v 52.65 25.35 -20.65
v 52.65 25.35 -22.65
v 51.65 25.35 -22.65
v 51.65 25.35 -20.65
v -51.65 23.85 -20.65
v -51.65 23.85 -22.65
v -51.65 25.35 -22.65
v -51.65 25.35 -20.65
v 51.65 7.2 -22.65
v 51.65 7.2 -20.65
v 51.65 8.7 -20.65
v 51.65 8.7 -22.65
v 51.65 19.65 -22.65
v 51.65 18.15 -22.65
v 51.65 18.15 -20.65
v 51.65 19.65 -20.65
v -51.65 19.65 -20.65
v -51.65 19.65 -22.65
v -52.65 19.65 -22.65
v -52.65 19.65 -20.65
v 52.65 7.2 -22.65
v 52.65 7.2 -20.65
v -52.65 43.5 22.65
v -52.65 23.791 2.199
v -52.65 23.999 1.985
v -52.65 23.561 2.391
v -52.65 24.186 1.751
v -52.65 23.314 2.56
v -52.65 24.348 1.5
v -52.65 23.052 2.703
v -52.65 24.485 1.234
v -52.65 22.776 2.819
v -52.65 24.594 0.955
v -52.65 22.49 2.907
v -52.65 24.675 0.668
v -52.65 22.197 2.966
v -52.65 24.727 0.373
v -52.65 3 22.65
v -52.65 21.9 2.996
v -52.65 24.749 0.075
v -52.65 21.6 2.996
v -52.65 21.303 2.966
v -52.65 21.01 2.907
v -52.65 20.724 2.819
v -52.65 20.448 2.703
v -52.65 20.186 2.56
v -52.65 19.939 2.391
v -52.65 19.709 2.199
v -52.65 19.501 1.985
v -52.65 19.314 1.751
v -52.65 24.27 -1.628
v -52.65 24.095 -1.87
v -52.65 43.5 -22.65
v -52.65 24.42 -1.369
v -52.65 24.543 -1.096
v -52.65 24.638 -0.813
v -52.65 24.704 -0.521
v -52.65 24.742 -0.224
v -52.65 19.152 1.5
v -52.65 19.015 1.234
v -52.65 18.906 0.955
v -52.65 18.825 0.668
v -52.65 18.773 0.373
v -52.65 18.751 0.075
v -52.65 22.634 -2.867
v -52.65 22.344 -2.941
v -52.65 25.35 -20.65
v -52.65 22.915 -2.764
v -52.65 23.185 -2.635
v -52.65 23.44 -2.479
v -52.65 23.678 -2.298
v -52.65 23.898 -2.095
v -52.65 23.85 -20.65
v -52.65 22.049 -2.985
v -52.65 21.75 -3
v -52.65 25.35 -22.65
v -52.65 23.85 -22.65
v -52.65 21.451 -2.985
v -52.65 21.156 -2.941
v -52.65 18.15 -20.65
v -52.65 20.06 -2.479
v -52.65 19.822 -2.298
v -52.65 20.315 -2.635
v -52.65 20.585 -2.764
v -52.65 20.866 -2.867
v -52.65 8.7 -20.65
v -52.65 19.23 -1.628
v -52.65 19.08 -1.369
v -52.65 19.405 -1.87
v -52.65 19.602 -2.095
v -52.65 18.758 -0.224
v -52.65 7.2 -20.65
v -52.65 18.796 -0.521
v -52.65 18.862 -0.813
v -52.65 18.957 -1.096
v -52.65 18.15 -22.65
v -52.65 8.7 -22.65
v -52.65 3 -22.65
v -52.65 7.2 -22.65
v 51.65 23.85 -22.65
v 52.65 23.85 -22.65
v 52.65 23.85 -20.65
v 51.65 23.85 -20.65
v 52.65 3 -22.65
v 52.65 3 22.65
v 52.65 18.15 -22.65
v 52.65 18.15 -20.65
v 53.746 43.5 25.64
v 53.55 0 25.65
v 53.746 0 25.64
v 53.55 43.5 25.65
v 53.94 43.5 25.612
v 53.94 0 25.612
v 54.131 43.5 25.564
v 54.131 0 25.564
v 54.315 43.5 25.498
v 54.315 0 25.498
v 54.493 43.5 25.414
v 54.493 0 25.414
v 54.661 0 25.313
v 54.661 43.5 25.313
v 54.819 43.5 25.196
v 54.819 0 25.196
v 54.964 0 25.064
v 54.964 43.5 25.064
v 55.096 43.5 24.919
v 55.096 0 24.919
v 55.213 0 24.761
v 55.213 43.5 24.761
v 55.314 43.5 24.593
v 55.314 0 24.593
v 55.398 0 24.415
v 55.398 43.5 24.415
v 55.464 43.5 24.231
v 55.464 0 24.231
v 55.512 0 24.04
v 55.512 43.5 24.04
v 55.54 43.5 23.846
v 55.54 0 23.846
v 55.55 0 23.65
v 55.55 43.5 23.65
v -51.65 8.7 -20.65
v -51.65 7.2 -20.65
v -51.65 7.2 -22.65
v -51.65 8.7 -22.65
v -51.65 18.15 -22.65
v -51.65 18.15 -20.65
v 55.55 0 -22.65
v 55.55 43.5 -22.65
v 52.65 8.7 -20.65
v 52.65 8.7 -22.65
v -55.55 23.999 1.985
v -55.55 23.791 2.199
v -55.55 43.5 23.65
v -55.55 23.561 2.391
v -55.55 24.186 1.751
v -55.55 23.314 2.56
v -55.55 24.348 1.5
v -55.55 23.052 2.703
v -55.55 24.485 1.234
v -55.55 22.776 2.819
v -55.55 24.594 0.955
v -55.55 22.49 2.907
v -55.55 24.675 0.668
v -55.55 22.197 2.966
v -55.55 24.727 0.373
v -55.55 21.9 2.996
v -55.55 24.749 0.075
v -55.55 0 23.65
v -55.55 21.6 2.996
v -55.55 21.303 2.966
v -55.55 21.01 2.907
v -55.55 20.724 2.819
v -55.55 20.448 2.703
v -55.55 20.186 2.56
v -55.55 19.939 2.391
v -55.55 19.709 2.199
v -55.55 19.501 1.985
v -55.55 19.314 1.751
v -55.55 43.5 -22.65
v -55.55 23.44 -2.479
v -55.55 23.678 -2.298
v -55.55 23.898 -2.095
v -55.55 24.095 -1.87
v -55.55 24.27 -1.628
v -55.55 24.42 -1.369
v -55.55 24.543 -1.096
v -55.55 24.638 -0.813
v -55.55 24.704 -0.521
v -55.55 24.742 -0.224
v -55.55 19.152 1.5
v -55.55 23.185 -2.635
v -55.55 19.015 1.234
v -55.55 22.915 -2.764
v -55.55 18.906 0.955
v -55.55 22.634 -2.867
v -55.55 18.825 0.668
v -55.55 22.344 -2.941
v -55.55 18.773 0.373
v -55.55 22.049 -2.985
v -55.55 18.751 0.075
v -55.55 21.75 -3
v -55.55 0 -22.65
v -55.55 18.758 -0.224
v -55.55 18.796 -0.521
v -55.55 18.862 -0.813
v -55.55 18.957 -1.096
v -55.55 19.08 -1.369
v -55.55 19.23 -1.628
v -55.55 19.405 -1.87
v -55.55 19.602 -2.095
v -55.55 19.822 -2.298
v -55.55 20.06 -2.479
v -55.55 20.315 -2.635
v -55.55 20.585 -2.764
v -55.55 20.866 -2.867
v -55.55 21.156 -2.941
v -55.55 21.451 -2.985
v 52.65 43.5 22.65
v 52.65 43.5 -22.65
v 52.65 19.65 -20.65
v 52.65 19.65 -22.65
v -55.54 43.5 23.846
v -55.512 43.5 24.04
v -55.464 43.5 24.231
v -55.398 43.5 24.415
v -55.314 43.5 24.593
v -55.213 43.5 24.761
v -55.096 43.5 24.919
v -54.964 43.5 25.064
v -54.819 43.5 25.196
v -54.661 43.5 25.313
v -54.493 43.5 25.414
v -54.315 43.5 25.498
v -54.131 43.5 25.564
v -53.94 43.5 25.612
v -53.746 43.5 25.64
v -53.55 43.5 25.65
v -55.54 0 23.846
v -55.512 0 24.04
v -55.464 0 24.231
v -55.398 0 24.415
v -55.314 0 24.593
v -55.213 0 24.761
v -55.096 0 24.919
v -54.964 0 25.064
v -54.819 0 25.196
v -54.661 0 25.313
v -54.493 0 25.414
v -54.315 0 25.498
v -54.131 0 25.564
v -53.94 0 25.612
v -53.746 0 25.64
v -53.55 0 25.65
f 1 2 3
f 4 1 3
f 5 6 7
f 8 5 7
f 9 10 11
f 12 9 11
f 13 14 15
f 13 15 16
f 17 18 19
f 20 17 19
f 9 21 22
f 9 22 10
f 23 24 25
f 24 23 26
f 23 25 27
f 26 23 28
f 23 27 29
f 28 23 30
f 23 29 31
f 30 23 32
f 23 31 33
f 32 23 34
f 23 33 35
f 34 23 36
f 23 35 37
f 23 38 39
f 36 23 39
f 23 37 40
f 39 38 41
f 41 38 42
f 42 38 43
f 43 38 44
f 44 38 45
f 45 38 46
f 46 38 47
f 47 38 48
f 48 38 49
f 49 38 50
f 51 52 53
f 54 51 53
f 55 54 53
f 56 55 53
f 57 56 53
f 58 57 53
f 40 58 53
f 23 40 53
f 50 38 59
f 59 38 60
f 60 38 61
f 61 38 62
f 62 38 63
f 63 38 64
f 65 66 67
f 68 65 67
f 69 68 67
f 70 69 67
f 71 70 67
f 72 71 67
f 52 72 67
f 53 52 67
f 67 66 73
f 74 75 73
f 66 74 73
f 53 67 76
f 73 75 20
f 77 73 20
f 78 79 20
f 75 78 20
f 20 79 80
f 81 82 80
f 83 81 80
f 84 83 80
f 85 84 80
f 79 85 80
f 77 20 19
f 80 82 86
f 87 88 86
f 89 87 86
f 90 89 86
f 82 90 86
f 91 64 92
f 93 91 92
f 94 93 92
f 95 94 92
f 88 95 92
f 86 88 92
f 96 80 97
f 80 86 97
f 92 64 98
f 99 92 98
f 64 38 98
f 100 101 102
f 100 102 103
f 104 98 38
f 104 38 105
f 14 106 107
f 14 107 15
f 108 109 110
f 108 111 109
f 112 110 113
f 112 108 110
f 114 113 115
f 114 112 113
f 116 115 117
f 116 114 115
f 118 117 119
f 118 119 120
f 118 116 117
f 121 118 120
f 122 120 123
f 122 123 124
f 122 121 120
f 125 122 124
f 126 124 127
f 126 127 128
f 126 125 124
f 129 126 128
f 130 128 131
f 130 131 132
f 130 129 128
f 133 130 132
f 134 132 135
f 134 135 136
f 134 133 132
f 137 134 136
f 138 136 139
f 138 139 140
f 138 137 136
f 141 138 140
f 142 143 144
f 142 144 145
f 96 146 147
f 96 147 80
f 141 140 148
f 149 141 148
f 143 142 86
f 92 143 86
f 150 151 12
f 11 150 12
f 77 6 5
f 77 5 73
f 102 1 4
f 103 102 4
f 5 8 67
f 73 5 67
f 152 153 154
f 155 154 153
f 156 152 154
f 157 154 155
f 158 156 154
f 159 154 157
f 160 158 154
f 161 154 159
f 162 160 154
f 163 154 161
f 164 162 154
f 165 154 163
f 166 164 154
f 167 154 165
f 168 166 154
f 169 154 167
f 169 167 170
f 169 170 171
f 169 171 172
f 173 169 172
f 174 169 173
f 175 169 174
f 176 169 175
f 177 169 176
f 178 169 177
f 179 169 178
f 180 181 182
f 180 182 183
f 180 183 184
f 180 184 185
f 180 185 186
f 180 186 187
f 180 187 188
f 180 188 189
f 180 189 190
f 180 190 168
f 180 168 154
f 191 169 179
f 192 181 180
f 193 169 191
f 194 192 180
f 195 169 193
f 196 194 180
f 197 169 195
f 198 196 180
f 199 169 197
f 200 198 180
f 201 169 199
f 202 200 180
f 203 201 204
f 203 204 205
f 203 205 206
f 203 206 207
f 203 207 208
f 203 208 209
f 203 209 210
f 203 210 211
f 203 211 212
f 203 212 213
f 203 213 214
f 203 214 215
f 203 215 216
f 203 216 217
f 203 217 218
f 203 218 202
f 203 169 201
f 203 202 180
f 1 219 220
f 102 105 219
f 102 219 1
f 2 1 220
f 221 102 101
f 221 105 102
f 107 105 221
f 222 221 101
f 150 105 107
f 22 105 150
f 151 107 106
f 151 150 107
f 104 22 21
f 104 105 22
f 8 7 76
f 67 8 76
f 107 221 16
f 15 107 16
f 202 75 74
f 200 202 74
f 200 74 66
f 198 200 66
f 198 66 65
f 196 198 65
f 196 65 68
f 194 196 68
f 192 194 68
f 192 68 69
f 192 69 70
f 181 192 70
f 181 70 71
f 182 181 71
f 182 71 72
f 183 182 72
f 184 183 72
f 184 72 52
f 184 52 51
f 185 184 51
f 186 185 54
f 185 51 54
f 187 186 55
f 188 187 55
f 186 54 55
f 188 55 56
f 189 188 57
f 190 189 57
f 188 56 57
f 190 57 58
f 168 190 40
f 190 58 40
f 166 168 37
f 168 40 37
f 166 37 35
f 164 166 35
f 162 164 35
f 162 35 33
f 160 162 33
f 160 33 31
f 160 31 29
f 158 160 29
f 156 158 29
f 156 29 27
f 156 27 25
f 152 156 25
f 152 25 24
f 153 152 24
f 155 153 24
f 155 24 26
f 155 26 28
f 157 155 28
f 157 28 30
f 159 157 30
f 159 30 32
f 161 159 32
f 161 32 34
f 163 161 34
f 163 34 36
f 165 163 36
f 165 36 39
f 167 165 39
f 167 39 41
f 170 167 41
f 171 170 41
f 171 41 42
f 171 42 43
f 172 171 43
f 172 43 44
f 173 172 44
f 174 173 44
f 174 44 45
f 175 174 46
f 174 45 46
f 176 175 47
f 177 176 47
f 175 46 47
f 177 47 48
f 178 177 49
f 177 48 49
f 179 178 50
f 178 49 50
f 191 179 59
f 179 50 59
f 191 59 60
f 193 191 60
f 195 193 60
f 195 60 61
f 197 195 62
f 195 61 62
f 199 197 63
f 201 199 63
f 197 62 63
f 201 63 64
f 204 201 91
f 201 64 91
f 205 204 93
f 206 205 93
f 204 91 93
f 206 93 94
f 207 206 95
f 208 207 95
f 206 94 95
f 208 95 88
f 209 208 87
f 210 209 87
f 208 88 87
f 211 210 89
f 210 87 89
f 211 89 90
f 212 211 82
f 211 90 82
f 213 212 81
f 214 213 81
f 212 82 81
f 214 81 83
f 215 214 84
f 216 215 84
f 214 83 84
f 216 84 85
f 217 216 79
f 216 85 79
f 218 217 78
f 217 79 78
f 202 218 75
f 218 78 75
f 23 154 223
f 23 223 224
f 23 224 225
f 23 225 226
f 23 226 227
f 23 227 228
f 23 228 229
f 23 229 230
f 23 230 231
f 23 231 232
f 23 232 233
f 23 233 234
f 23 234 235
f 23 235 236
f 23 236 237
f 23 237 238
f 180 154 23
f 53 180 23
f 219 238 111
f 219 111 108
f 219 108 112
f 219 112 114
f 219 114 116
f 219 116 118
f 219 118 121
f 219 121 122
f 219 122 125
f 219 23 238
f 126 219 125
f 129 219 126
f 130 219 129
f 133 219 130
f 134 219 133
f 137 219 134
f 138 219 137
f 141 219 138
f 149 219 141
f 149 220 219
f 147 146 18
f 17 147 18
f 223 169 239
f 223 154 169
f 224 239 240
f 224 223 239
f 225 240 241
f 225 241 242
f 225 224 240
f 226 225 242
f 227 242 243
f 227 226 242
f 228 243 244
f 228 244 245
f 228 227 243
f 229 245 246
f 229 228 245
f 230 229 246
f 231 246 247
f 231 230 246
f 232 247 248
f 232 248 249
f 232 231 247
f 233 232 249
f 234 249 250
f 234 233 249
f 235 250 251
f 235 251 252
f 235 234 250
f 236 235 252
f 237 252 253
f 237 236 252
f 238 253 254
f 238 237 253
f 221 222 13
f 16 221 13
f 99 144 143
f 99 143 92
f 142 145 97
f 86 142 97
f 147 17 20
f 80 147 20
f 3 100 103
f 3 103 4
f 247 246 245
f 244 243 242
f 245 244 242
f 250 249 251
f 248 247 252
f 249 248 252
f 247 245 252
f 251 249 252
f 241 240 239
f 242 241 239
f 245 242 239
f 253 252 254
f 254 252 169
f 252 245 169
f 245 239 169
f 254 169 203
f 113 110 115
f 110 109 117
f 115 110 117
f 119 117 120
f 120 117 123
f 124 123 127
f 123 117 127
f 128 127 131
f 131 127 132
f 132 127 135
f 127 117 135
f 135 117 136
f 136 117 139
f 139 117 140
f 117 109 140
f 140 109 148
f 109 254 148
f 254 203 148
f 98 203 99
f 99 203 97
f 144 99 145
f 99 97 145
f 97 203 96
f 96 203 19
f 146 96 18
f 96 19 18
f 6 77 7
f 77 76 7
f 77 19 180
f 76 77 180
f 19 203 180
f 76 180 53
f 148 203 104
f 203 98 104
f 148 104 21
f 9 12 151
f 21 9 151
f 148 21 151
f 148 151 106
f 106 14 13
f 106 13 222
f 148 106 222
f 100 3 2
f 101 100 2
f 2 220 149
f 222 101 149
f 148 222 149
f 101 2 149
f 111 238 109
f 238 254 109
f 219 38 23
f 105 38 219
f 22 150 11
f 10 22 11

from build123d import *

# Parameters (mm, degrees)
SKETCH1_W           = 111.1
SKETCH1_H           = 51.3
BOSS_EXTRUDE1_DEPTH = 3
SKETCH2_W           = 111.1
SKETCH2_H           = 51.3
SKETCH2_W_2         = 105.3
SKETCH2_H_2         = 45.3
BOSS_EXTRUDE2_DEPTH = 40.5
SKETCH5_R           = 21
BOSS_EXTRUDE4_DEPTH = 15
SKETCH6_W           = 15.5
SKETCH6_H           = 37
CUT_EXTRUDE1_DEPTH  = 21
BOSS_EXTRUDE5_START = -1
SKETCH8_R           = 21
SKETCH8_W           = 12.3
SKETCH8_H           = 34.3
BOSS_EXTRUDE5_DEPTH = 1
BOSS_EXTRUDE6_START = -1
SKETCH9_R           = 21
SKETCH9_W           = 12.3
SKETCH9_H           = 34.3
BOSS_EXTRUDE6_DEPTH = 1
SKETCH10_W          = 126.244554882
SKETCH10_H          = 68.697179438
CUT_EXTRUDE3_DEPTH  = 53
SKETCH12_W          = 1
SKETCH12_H          = 1.5
BOSS_EXTRUDE8_DEPTH = 2
FILLET1_R           = 2
SKETCH13_R          = 3
CUT_EXTRUDE4_DEPTH  = 14


with BuildPart() as part:
    # Sketch1 → Boss-Extrude1 (new body)
    with BuildSketch(Plane(origin=(0, 0, 0), x_dir=(1, 0, 0), z_dir=(0, 1, 0))):
        Rectangle(SKETCH1_W, SKETCH1_H)
    extrude(amount=BOSS_EXTRUDE1_DEPTH)

    # Sketch2 → Boss-Extrude2 (add)
    with BuildSketch(Plane(origin=(0, 3, 0), x_dir=(1, 0, 0), z_dir=(0, 1, 0))):
        Rectangle(SKETCH2_W, SKETCH2_H)
        Rectangle(SKETCH2_W_2, SKETCH2_H_2, mode=Mode.SUBTRACT)
    extrude(amount=BOSS_EXTRUDE2_DEPTH)

    # Sketch5 → Boss-Extrude4 (add)
    with BuildSketch(Plane(origin=(0, 0, -25.65), x_dir=(-1, 0, 0), z_dir=(0, 0, -1))):
        with Locations((-27.775, 21.75)):
            Circle(SKETCH5_R)
        with Locations(Location((27.775, 21.75, 0), (0, 0, 180))):
            Circle(SKETCH5_R)
    extrude(amount=BOSS_EXTRUDE4_DEPTH)

    # Sketch6 → Cut-Extrude1 (cut)
    with BuildSketch(Plane(origin=(0, 0, -40.65), x_dir=(-1, 0, 0), z_dir=(0, 0, -1))):
        with Locations((-27.775, 21.75)):
            Rectangle(SKETCH6_W, SKETCH6_H)
        with Locations((27.775, 21.75)):
            Rectangle(SKETCH6_W, SKETCH6_H)
    extrude(amount=-CUT_EXTRUDE1_DEPTH, mode=Mode.SUBTRACT)

    # Sketch8 → Boss-Extrude5 (add)
    with BuildSketch(Plane(origin=(0, 0, -40.65), x_dir=(-1, 0, 0), z_dir=(0, 0, -1)).offset(BOSS_EXTRUDE5_START)):
        with Locations((-27.775, 21.75)):
            Circle(SKETCH8_R)
        with Locations((-27.775, 21.75)):
            Rectangle(SKETCH8_W, SKETCH8_H, mode=Mode.SUBTRACT)
    extrude(amount=BOSS_EXTRUDE5_DEPTH)

    # Sketch9 → Boss-Extrude6 (add)
    with BuildSketch(Plane(origin=(0, 0, -40.65), x_dir=(-1, 0, 0), z_dir=(0, 0, -1)).offset(BOSS_EXTRUDE6_START)):
        with Locations(Location((27.775, 21.75, 0), (0, 0, 180))):
            Circle(SKETCH9_R)
        with Locations((27.775, 21.75)):
            Rectangle(SKETCH9_W, SKETCH9_H, mode=Mode.SUBTRACT)
    extrude(amount=BOSS_EXTRUDE6_DEPTH)

    # Sketch10 → Cut-Extrude3 (cut)
    with BuildSketch(Plane.XY.offset(-22.65)):
        with Locations((0, 21.75)):
            Rectangle(SKETCH10_W, SKETCH10_H)
    extrude(amount=-CUT_EXTRUDE3_DEPTH, mode=Mode.SUBTRACT)

    # Sketch12 → Boss-Extrude8 (add)
    with BuildSketch(Plane(origin=(0, 0, -22.65), x_dir=(-1, 0, 0), z_dir=(0, 0, -1))):
        with Locations((52.15, 18.9)):
            Rectangle(SKETCH12_W, SKETCH12_H)
        with Locations((52.15, 7.95)):
            Rectangle(SKETCH12_W, SKETCH12_H)
        with Locations((-52.15, 18.9)):
            Rectangle(SKETCH12_W, SKETCH12_H)
        with Locations((-52.15, 24.6)):
            Rectangle(SKETCH12_W, SKETCH12_H)
        with Locations((52.15, 24.6)):
            Rectangle(SKETCH12_W, SKETCH12_H)
        with Locations((-52.15, 7.95)):
            Rectangle(SKETCH12_W, SKETCH12_H)
    extrude(amount=-BOSS_EXTRUDE8_DEPTH)

    # Fillet1
    fillet1_edges = [part.edges().sort_by_distance(p)[0] for p in [
        (55.55, 21.75, 25.65),
        (-55.55, 21.75, 25.65),
    ]]
    fillet(fillet1_edges, radius=FILLET1_R)

    # Sketch13 → Cut-Extrude4 (cut)
    with BuildSketch(Plane(origin=(-52.65, 0, 0), x_dir=(0, 0, -1), z_dir=(1, 0, 0))):
        with Locations((0, 21.75)):
            Circle(SKETCH13_R)
    extrude(amount=-CUT_EXTRUDE4_DEPTH, mode=Mode.SUBTRACT)


solid = part.part
